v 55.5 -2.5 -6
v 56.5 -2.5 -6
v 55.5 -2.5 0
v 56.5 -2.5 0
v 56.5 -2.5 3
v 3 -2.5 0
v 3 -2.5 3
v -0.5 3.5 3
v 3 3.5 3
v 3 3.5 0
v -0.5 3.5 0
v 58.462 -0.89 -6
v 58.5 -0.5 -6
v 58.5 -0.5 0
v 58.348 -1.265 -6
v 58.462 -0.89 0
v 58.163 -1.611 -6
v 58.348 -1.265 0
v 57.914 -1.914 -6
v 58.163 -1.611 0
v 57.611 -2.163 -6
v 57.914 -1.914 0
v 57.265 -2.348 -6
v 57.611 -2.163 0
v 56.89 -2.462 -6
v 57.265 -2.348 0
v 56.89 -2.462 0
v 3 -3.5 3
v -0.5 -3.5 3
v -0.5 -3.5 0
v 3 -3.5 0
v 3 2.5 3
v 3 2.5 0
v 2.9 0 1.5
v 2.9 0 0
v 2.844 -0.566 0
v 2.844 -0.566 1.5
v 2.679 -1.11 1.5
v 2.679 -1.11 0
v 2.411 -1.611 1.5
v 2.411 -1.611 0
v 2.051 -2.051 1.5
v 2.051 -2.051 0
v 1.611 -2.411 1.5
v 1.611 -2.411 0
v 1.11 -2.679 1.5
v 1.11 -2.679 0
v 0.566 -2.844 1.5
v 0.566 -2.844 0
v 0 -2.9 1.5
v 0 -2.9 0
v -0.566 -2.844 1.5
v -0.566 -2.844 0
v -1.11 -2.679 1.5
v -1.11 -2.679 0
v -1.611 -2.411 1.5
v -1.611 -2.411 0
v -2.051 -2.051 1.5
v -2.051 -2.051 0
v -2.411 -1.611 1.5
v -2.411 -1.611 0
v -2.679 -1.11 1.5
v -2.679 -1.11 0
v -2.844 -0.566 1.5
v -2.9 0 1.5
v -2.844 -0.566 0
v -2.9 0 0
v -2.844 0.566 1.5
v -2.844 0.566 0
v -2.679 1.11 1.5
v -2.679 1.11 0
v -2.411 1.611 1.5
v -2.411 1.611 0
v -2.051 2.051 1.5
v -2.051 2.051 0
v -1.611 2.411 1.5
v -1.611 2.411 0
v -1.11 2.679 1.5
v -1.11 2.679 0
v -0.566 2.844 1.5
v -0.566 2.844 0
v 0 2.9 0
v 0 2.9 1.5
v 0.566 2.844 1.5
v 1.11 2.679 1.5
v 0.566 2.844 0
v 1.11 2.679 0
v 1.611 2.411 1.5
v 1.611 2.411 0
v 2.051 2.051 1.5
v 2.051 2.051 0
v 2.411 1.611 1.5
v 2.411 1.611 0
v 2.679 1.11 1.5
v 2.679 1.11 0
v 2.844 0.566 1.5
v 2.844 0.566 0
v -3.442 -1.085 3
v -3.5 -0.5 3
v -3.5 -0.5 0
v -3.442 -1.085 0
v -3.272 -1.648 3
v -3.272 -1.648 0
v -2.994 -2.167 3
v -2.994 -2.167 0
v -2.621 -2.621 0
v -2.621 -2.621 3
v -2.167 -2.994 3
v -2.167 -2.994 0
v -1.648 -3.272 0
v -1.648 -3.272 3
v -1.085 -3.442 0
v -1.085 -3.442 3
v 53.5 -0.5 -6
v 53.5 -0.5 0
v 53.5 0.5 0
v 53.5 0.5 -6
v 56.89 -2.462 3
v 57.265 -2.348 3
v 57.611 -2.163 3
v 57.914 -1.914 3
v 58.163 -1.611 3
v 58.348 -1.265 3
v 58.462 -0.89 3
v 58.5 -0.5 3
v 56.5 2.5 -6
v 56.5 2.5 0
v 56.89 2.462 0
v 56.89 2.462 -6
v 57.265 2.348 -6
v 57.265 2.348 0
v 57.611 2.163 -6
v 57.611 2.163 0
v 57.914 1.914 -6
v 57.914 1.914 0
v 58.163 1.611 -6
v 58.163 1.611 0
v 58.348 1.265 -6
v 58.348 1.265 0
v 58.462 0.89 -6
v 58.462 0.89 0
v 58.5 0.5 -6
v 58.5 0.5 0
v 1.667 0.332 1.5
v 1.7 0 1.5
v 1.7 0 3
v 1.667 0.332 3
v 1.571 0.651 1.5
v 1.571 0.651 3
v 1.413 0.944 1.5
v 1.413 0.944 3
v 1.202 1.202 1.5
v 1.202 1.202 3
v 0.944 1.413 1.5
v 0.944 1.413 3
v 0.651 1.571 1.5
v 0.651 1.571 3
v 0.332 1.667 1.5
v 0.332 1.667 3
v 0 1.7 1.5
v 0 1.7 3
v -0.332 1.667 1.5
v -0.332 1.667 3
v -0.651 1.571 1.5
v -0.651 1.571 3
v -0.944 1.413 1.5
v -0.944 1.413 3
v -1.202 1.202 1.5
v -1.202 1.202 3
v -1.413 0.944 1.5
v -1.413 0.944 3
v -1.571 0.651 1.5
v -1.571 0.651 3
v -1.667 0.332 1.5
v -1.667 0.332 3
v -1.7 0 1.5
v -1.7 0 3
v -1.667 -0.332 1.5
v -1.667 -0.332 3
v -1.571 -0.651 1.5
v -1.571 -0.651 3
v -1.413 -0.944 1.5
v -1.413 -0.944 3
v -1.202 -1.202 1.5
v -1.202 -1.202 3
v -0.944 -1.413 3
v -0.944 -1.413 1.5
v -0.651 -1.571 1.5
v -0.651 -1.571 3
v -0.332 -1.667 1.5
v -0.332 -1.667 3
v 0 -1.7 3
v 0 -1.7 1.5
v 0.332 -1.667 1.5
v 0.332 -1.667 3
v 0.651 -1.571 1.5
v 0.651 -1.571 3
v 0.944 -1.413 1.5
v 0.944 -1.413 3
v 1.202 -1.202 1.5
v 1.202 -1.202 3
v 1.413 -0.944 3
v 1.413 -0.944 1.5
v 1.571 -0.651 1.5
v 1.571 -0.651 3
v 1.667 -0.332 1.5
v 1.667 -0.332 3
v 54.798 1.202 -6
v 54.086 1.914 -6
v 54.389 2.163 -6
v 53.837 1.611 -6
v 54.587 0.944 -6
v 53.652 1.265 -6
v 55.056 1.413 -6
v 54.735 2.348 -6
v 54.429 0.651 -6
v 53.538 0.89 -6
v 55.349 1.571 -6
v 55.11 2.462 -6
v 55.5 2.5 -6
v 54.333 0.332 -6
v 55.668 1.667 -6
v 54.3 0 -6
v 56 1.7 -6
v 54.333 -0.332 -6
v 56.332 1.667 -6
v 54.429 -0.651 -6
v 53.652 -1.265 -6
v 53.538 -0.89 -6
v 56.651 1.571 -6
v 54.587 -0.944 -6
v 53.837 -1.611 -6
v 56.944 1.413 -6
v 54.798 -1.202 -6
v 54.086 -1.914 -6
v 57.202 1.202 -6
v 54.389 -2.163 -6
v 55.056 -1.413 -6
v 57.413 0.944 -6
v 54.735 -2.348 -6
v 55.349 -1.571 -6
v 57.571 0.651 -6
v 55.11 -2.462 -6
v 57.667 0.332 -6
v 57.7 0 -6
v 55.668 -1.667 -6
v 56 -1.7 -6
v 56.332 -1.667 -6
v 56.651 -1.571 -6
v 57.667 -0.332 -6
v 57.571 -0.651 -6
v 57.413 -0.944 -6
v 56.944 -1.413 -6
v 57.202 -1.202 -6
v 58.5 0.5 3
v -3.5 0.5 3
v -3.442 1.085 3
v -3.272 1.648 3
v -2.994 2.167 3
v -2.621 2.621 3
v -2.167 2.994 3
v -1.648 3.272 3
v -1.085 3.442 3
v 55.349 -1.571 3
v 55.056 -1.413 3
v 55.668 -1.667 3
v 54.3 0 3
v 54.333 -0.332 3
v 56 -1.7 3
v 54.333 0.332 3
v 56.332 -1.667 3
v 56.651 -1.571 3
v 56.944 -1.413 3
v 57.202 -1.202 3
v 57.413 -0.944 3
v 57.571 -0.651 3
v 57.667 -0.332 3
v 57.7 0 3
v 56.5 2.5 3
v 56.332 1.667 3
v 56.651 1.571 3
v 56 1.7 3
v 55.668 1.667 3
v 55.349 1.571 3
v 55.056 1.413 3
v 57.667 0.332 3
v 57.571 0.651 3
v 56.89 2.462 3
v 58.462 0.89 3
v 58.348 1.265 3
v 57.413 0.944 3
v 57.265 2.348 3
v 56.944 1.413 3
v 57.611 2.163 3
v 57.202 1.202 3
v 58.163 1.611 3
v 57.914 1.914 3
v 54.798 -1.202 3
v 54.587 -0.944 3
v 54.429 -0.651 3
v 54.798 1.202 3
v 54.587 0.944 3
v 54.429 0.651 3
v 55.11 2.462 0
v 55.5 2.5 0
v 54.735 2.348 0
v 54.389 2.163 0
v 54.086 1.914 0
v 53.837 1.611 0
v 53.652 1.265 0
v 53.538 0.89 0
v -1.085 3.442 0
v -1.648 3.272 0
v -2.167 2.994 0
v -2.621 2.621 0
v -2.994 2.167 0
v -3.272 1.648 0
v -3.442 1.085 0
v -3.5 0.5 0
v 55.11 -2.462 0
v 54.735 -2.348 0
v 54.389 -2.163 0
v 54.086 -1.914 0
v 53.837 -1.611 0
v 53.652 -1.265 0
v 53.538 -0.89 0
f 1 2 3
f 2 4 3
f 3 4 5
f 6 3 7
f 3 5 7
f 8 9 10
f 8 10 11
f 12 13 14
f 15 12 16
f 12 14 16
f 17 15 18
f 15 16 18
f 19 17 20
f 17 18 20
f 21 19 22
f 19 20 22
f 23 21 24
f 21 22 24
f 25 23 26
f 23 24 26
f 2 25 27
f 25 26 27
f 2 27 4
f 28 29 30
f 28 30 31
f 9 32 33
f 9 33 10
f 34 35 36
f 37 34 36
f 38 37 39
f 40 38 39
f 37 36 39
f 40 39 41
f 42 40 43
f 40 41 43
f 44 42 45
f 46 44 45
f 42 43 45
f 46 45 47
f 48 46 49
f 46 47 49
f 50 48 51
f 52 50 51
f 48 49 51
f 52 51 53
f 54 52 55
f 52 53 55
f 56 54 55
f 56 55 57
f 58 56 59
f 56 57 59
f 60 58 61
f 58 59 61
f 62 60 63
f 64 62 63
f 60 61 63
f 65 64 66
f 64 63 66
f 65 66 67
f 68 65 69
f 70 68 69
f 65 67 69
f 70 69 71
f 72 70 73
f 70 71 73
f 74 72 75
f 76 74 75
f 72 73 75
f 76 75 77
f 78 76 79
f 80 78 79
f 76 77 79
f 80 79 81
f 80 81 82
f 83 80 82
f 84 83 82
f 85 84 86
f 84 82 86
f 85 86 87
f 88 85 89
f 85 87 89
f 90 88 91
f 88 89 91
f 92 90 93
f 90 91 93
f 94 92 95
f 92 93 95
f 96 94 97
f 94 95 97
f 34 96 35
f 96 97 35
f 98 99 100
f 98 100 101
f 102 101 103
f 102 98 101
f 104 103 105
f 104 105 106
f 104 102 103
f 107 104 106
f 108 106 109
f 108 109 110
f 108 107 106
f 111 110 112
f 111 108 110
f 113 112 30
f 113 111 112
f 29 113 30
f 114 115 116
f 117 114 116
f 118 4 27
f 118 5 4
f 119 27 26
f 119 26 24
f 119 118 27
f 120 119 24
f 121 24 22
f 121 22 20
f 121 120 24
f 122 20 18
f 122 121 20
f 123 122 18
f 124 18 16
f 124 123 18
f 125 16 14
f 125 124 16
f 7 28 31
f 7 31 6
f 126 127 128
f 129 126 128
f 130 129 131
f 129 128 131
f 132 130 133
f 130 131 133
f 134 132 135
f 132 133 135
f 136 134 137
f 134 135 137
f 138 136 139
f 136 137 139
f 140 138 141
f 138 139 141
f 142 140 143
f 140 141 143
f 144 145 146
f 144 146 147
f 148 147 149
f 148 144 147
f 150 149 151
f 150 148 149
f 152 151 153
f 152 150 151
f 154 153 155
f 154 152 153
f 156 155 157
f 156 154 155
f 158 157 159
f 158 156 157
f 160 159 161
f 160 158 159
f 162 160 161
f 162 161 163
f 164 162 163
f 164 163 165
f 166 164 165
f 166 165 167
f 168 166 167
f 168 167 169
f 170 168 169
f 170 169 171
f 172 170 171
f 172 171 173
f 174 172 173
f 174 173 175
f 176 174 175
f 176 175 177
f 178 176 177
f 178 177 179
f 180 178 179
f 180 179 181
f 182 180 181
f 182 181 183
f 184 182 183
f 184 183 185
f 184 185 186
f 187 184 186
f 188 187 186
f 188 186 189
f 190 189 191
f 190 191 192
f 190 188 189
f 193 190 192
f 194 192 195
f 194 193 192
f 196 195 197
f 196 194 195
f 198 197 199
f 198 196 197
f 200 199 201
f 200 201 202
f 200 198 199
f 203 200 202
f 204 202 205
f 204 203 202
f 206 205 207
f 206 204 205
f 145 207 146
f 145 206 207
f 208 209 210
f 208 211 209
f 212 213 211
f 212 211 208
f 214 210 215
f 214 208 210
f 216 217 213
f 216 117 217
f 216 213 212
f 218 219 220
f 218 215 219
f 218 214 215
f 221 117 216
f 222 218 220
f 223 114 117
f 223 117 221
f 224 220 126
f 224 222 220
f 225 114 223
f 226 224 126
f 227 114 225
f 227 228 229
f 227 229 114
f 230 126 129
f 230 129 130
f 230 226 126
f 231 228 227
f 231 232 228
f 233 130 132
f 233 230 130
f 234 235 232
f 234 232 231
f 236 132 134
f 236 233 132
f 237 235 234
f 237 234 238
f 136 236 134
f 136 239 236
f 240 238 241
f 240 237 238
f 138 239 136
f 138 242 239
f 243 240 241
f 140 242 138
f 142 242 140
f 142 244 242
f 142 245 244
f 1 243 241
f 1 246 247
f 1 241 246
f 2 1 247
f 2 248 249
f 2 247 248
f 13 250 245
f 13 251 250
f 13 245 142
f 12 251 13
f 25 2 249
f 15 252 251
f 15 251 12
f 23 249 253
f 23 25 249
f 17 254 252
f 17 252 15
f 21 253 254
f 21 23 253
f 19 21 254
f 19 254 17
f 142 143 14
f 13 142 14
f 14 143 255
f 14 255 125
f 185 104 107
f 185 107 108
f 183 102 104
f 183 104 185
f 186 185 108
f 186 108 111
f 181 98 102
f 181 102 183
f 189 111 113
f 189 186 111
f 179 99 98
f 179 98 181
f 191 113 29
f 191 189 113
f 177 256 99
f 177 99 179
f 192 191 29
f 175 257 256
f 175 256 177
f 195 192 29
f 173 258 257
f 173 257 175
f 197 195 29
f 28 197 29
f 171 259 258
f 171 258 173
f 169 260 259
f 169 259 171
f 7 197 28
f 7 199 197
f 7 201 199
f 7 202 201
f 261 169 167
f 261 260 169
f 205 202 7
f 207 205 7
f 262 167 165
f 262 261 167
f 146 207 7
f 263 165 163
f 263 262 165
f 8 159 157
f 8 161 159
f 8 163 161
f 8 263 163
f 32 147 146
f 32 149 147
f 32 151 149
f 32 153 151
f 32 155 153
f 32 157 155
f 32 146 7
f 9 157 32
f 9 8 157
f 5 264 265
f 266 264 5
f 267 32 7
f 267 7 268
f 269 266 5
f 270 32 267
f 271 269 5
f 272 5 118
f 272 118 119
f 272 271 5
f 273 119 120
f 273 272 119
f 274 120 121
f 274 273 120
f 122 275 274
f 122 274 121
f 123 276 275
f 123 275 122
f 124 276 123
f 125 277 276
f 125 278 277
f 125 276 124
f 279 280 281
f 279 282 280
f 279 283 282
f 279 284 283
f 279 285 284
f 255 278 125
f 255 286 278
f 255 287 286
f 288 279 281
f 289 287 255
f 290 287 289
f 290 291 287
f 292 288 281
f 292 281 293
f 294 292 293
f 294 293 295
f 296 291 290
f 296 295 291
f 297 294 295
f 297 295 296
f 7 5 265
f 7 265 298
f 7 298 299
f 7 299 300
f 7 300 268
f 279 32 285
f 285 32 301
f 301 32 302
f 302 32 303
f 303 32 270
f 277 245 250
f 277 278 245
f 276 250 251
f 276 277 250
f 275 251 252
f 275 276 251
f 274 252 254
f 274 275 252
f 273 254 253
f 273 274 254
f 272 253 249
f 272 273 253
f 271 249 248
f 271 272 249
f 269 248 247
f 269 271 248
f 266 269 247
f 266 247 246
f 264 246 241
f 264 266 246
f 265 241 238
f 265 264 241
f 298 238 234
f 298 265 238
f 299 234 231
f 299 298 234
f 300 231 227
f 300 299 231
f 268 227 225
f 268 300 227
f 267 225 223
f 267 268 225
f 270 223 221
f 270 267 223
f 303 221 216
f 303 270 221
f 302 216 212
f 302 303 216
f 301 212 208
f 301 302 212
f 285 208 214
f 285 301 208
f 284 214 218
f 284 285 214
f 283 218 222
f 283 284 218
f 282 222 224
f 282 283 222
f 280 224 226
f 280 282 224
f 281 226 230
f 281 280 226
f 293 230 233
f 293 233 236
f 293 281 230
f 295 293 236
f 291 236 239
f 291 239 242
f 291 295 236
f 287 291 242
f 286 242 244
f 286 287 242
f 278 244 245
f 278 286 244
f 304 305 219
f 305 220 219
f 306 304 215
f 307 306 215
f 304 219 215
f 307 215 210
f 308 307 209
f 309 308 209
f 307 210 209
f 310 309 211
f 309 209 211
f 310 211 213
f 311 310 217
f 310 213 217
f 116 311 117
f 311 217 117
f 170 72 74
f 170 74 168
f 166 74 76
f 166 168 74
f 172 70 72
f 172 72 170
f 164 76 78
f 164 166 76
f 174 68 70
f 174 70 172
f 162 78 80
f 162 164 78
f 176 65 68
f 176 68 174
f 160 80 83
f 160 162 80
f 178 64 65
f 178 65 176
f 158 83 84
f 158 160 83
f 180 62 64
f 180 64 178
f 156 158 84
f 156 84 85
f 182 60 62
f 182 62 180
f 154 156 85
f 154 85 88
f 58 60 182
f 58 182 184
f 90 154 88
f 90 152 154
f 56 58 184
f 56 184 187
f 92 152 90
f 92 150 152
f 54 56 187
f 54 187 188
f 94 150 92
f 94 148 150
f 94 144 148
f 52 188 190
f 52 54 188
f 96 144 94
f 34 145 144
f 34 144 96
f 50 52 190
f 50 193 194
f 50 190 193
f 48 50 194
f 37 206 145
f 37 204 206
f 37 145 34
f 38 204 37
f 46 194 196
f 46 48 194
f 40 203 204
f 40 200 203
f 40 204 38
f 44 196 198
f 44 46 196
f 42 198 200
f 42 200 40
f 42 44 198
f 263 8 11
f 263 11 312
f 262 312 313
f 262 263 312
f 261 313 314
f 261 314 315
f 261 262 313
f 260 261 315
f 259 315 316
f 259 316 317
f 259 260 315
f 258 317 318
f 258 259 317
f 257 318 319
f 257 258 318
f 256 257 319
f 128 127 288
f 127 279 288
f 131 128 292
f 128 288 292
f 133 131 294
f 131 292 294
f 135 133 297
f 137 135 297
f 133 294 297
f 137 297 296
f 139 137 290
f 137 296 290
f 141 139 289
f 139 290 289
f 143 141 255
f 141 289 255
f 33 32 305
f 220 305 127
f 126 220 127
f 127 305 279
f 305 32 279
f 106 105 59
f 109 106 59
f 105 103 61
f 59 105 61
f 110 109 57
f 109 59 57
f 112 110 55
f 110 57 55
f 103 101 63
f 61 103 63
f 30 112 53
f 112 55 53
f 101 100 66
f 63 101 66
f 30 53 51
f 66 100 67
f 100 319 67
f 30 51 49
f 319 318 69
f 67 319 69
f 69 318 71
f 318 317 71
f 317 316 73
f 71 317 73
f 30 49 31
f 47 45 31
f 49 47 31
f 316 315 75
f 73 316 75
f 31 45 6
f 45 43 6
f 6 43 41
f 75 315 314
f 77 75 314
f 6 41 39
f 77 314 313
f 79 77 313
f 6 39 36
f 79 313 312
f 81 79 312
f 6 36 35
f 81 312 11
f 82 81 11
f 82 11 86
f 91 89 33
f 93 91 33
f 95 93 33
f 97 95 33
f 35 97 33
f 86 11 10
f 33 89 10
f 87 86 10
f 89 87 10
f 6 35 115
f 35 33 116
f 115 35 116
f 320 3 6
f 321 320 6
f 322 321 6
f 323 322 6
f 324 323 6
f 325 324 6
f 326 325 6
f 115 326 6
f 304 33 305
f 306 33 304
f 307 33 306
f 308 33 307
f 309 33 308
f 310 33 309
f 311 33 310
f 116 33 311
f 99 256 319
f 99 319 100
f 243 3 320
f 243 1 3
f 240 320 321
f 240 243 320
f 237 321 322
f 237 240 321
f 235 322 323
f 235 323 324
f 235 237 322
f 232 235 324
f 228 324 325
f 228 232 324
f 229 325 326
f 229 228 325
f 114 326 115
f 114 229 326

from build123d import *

# Parameters (mm, degrees)
F0_R     = 1.7
F1_DEPTH = 3
F2_R     = 2
F3_R     = 1.7
F4_DEPTH = 6
F5_R     = 2
F6_R     = 1.7
F7_DEPTH = 3
F8_R     = 2.9
F9_DEPTH = 1.5


with BuildPart() as f1:
    # F0 (on Top) → F1 (new body)
    with BuildSketch(Plane.XY):
        Polygon((-2.5, 2.5), (-2.5, 0), (-2.5, -2.5), (58.5, -2.5), (58.5, 0), (58.5, 2.5), align=None)
        Circle(F0_R, mode=Mode.SUBTRACT)
        with Locations((56, 0)):
            Circle(F0_R, mode=Mode.SUBTRACT)
    extrude(amount=F1_DEPTH)

    # F2
    f2_edges = [f1.edges().sort_by_distance(p)[0] for p in [
        (-2.5, 2.5, 1.5),
        (-2.5, -2.5, 1.5),
        (58.5, 2.5, 1.5),
        (58.5, -2.5, 1.5),
    ]]
    fillet(f2_edges, radius=F2_R)

    # F3 (on face) → F4 (join)
    with BuildSketch(Plane(origin=(0, 0, 0), x_dir=(1, 0, 0), z_dir=(0, 0, -1))):
        with BuildLine():
            Line((53.5, -2.5), (56.5, -2.5))
            ThreePointArc((56.5, -2.5), (57.9142135624, -1.9142135624), (58.5, -0.5))
            Line((58.5, -0.5), (58.5, 0.5))
            ThreePointArc((58.5, 0.5), (57.9142135624, 1.9142135624), (56.5, 2.5))
            Line((56.5, 2.5), (53.5, 2.5))
            Line((53.5, 2.5), (53.5, -2.5))
        make_face()
        with Locations((56, 0)):
            Circle(F3_R, mode=Mode.SUBTRACT)
    extrude(amount=F4_DEPTH)

    # F5
    f5_edges = [f1.edges().sort_by_distance(p)[0] for p in [
        (53.5, 2.5, -3),
        (53.5, -2.5, -3),
    ]]
    fillet(f5_edges, radius=F5_R)

    # F6 (on face) → F7 (join, through all)
    with BuildSketch(Plane.XY.offset(3)):
        with BuildLine():
            ThreePointArc((-0.5, 3.5), (-2.6213203436, 2.6213203436), (-3.5, 0.5))
            Line((-3.5, 0.5), (-3.5, -0.5))
            ThreePointArc((-3.5, -0.5), (-2.6213203436, -2.6213203436), (-0.5, -3.5))
            Line((-0.5, -3.5), (3, -3.5))
            Line((3, -3.5), (3, -2.5))
            Line((3, -2.5), (3, 2.5))
            Line((3, 2.5), (3, 3.5))
            Line((3, 3.5), (-0.5, 3.5))
        make_face()
        Circle(F6_R, mode=Mode.SUBTRACT)
    extrude(amount=-F7_DEPTH)

    # F8 (on face) → F9 (cut)
    with BuildSketch(Plane(origin=(0, 0, 0), x_dir=(1, 0, 0), z_dir=(0, 0, -1))):
        Circle(F8_R)
    extrude(amount=-F9_DEPTH, mode=Mode.SUBTRACT)


solid = f1.part
